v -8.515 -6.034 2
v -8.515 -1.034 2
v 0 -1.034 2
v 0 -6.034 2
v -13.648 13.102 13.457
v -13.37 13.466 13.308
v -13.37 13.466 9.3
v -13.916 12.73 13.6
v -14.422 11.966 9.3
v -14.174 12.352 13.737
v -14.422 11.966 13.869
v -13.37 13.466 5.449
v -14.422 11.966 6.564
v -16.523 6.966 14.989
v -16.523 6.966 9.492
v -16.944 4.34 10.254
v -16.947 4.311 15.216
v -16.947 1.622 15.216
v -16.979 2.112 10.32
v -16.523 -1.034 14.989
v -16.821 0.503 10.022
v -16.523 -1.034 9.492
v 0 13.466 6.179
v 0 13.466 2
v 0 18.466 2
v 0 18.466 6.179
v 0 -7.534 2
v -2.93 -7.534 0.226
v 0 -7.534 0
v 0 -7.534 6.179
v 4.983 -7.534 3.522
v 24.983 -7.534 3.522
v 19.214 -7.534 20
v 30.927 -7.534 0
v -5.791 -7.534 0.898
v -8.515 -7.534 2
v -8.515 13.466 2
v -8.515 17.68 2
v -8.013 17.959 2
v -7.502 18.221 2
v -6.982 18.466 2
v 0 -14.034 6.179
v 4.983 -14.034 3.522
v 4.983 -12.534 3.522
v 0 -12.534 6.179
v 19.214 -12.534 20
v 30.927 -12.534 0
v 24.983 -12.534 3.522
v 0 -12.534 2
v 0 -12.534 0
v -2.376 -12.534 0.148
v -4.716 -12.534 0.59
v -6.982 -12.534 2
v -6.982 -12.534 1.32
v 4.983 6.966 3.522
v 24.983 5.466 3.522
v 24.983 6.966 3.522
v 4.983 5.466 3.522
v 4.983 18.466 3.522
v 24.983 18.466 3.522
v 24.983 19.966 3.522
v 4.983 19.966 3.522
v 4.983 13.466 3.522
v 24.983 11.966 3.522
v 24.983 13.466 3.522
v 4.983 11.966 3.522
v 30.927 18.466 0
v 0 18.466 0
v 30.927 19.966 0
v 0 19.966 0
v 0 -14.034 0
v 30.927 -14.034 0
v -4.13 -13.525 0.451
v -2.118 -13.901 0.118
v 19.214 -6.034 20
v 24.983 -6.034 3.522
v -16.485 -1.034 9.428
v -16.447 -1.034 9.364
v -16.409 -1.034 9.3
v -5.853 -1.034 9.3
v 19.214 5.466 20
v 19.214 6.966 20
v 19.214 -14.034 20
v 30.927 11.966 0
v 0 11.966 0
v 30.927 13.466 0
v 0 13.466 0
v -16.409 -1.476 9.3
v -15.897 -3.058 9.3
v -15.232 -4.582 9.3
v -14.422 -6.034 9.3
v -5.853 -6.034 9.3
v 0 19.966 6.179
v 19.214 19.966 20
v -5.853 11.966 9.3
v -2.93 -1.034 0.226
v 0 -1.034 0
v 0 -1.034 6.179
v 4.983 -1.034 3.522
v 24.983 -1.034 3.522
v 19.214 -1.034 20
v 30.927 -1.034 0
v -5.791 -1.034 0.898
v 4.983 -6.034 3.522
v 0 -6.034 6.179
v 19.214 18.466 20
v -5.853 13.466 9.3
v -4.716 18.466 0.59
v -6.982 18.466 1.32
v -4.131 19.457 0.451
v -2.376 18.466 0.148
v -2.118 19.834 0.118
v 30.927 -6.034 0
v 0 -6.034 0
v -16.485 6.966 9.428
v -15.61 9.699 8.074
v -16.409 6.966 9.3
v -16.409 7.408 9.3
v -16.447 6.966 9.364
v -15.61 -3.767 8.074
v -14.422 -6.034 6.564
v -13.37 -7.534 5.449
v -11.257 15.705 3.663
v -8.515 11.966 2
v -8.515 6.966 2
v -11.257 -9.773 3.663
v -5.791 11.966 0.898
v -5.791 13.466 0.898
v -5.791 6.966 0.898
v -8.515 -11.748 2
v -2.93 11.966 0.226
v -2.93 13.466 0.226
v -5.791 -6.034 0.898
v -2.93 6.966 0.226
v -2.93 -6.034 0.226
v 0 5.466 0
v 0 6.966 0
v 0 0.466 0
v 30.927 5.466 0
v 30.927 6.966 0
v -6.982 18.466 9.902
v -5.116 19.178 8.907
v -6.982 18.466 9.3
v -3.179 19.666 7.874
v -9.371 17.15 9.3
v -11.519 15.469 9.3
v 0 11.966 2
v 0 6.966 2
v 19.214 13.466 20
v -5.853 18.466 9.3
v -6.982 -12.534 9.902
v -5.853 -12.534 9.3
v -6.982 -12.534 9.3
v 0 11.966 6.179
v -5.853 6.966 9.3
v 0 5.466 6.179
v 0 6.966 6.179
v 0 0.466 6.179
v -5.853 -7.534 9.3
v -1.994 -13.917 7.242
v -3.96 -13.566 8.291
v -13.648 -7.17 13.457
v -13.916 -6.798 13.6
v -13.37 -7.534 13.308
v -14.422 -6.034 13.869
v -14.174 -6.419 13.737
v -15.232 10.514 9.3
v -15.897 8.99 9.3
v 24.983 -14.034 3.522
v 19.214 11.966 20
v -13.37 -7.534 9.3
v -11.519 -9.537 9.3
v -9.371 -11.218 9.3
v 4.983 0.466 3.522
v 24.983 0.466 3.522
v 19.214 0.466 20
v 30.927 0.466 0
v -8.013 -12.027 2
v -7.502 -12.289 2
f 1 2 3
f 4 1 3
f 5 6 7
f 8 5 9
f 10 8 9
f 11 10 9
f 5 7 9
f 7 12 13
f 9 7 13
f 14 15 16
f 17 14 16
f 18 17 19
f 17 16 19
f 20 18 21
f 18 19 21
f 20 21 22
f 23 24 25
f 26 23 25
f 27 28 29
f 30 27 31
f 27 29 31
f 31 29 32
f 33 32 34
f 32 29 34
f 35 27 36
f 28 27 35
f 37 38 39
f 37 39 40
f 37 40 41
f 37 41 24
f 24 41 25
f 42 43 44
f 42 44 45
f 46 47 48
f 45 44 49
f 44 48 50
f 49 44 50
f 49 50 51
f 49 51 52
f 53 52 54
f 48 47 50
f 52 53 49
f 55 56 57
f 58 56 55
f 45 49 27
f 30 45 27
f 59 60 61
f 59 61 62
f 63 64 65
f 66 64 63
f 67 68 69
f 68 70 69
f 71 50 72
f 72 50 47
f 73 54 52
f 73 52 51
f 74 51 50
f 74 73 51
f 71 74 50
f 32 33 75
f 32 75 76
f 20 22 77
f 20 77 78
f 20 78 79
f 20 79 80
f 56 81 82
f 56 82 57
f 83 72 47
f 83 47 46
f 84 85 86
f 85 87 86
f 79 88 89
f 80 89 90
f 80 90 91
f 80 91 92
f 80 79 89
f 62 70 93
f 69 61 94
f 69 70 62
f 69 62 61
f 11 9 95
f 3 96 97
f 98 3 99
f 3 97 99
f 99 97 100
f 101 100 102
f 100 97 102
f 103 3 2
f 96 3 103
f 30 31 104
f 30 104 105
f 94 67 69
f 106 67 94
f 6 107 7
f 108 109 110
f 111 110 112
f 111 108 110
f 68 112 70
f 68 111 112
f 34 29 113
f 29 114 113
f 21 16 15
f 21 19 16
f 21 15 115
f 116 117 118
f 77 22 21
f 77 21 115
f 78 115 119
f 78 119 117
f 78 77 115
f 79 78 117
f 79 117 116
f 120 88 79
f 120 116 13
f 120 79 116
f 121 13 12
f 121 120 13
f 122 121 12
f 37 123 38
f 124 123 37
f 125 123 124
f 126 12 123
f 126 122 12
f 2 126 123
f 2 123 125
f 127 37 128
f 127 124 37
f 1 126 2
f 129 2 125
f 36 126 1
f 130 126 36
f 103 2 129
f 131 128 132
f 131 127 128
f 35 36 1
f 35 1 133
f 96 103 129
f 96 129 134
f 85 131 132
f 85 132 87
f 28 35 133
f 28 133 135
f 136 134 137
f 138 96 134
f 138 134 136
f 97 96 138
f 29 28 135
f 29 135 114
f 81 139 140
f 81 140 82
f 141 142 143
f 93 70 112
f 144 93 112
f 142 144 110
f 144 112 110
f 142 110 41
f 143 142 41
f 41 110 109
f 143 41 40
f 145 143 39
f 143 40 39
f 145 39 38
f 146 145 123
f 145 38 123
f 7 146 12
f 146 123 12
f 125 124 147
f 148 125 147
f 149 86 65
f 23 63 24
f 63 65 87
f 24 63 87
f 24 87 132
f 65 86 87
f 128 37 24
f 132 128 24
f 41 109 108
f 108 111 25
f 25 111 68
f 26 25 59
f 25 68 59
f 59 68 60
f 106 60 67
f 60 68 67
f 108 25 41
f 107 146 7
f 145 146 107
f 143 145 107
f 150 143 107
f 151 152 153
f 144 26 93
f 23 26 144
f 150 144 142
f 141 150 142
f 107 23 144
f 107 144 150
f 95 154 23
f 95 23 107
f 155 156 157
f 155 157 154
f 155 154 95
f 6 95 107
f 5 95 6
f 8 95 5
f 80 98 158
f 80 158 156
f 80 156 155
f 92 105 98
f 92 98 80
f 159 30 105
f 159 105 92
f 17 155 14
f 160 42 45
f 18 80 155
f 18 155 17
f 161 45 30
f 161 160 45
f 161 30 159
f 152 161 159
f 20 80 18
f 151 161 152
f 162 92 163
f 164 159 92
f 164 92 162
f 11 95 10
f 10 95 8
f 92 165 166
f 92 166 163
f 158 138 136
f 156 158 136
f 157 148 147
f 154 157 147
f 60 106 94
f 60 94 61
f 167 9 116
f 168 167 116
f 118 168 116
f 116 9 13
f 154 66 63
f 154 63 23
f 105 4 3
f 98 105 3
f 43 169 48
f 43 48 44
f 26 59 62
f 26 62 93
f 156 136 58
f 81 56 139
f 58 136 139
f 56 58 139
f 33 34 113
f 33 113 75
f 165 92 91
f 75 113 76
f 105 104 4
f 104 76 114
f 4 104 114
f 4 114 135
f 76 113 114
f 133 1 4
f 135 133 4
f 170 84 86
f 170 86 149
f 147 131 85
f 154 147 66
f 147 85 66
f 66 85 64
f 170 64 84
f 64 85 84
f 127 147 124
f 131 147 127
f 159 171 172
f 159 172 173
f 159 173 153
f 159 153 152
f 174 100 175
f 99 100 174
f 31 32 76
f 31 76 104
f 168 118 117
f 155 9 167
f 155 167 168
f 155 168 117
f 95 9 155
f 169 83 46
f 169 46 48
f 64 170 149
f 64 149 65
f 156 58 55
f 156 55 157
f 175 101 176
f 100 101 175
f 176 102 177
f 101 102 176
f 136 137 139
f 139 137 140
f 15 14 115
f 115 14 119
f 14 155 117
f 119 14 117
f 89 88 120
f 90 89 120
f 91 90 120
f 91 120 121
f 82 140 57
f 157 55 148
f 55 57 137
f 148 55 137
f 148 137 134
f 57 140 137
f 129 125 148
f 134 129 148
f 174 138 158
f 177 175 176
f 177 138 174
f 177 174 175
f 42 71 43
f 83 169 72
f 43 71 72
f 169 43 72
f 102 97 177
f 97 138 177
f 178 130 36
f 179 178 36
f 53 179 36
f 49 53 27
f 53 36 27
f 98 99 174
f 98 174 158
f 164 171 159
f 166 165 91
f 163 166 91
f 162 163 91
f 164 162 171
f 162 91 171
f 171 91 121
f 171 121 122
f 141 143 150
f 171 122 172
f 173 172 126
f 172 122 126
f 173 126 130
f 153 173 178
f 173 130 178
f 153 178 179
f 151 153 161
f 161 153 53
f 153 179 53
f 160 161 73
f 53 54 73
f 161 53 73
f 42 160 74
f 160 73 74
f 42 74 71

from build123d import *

# Parameters (mm, degrees)
F0_W     = 30.9265870601
F0_H     = 1.5
F1_DEPTH = 20
F2_START = 2
F2_DEPTH = 7.3
F4_DEPTH = 40


with BuildPart() as f1:
    # F0 (on Top) → F1 (new body)
    with BuildSketch(Plane.XY):
        with Locations((15.46329353, -13.2838593498)):
            Rectangle(F0_W, F0_H)
        with BuildLine():
            ThreePointArc((-6.9821200219, -12.5338593498), (-3.5707142143, -13.6546294884), (0, -14.0338593498))
            Line((0, -14.0338593498), (0, -12.5338593498))
            Line((0, -12.5338593498), (-6.9821200219, -12.5338593498))
        make_face()
    extrude(amount=F1_DEPTH)



with BuildPart() as f1b:
    # F0 (on Top) → F1, piece 2 (new body)
    with BuildSketch(Plane.XY):
        with Locations((15.46329353, -6.7838593498)):
            Rectangle(F0_W, F0_H)
        with BuildLine():
            Line((-13.3697419571, -7.5338593498), (0, -7.5338593498))
            Line((0, -7.5338593498), (0, -6.0338593498))
            Line((0, -6.0338593498), (-14.4222051019, -6.0338593498))
            ThreePointArc((-14.4222051019, -6.0338593498), (-13.9161984871, -6.7980500314), (-13.3697419571, -7.5338593498))
        make_face()
    extrude(amount=F1_DEPTH)


with BuildPart() as f1c:
    # F0 (on Top) → F1, piece 3 (new body)
    with BuildSketch(Plane.XY):
        with Locations((15.46329353, -0.2838593498)):
            Rectangle(F0_W, F0_H)
        with Locations((15.46329353, 6.2161406502)):
            Rectangle(F0_W, F0_H)
        with BuildLine():
            Line((-16.5227116419, -1.0338593498), (0, -1.0338593498))
            Line((0, -1.0338593498), (0, 0.4661406502))
            Line((0, 0.4661406502), (0, 5.4661406502))
            Line((0, 5.4661406502), (0, 6.9661406502))
            Line((0, 6.9661406502), (-16.5227116419, 6.9661406502))
            ThreePointArc((-16.5227116419, 6.9661406502), (-17, 2.9661406502), (-16.5227116419, -1.0338593498))
        make_face()
    extrude(amount=F1_DEPTH)


with BuildPart() as f1d:
    # F0 (on Top) → F1, piece 4 (new body)
    with BuildSketch(Plane.XY):
        with Locations((15.46329353, 12.7161406502)):
            Rectangle(F0_W, F0_H)
        with BuildLine():
            ThreePointArc((-13.3697419571, 13.4661406502), (-13.9161984871, 12.7303313319), (-14.4222051019, 11.9661406502))
            Line((-14.4222051019, 11.9661406502), (0, 11.9661406502))
            Line((0, 11.9661406502), (0, 13.4661406502))
            Line((0, 13.4661406502), (-13.3697419571, 13.4661406502))
        make_face()
    extrude(amount=F1_DEPTH)


with BuildPart() as f1e:
    # F0 (on Top) → F1, piece 5 (new body)
    with BuildSketch(Plane.XY):
        with Locations((15.46329353, 19.2161406502)):
            Rectangle(F0_W, F0_H)
        with BuildLine():
            ThreePointArc((0, 19.9661406502), (-3.5707142143, 19.5869107888), (-6.9821200219, 18.4661406502))
            Line((-6.9821200219, 18.4661406502), (0, 18.4661406502))
            Line((0, 18.4661406502), (0, 19.9661406502))
        make_face()
    extrude(amount=F1_DEPTH)


with BuildPart() as f1_1:
    add(f1.part)

    add(f1b.part)  # F2 merges F1b

    add(f1c.part)  # F2 merges F1c

    add(f1d.part)  # F2 merges F1d

    add(f1e.part)  # F2 merges F1e
    # F0 (on Top) → F2 (join)
    with BuildSketch(Plane.XY.offset(F2_START)):
        with BuildLine():
            Line((-6.9821200219, -12.5338593498), (0, -12.5338593498))
            Line((0, -12.5338593498), (0, -7.5338593498))
            Line((0, -7.5338593498), (-13.3697419571, -7.5338593498))
            ThreePointArc((-13.3697419571, -7.5338593498), (-10.4785290715, -10.4204357791), (-6.9821200219, -12.5338593498))
        make_face()
        with BuildLine():
            Line((-14.4222051019, -6.0338593498), (0, -6.0338593498))
            Line((0, -6.0338593498), (0, -1.0338593498))
            Line((0, -1.0338593498), (-16.5227116419, -1.0338593498))
            ThreePointArc((-16.5227116419, -1.0338593498), (-15.6731288538, -3.6181612817), (-14.4222051019, -6.0338593498))
        make_face()
        with BuildLine():
            Line((-16.5227116419, -1.0338593498), (0, -1.0338593498))
            Line((0, -1.0338593498), (0, 0.4661406502))
            Line((0, 0.4661406502), (0, 5.4661406502))
            Line((0, 5.4661406502), (0, 6.9661406502))
            Line((0, 6.9661406502), (-16.5227116419, 6.9661406502))
            ThreePointArc((-16.5227116419, 6.9661406502), (-17, 2.9661406502), (-16.5227116419, -1.0338593498))
        make_face()
        with BuildLine():
            ThreePointArc((-14.4222051019, 11.9661406502), (-15.6731288538, 9.5504425822), (-16.5227116419, 6.9661406502))
            Line((-16.5227116419, 6.9661406502), (0, 6.9661406502))
            Line((0, 6.9661406502), (0, 11.9661406502))
            Line((0, 11.9661406502), (-14.4222051019, 11.9661406502))
        make_face()
        with BuildLine():
            ThreePointArc((-6.9821200219, 18.4661406502), (-10.4785290715, 16.3527170795), (-13.3697419571, 13.4661406502))
            Line((-13.3697419571, 13.4661406502), (0, 13.4661406502))
            Line((0, 13.4661406502), (0, 18.4661406502))
            Line((0, 18.4661406502), (-6.9821200219, 18.4661406502))
        make_face()
    extrude(amount=F2_DEPTH)

    # F3 (on face) → F4 (intersect)
    with BuildSketch(Plane.XZ.offset(14.0338593498)):
        with BuildLine():
            Line((0, 6.1789047227), (-18.9112946391, 16.2631310523))
            ThreePointArc((-18.9112946391, 16.2631310523), (-12.4712318613, 4.6249463152), (0, 0))
            Line((0, 0), (0, 6.1789047227))
        make_face()
        Polygon((0, 6.1789047227), (0, 0), (30.9265870601, 0), (19.2144531757, 20), (24.9826789947, 3.5219495185), (4.9826789947, 3.5219495185), align=None)
    extrude(amount=-F4_DEPTH, mode=Mode.INTERSECT)


solid = f1_1.part
